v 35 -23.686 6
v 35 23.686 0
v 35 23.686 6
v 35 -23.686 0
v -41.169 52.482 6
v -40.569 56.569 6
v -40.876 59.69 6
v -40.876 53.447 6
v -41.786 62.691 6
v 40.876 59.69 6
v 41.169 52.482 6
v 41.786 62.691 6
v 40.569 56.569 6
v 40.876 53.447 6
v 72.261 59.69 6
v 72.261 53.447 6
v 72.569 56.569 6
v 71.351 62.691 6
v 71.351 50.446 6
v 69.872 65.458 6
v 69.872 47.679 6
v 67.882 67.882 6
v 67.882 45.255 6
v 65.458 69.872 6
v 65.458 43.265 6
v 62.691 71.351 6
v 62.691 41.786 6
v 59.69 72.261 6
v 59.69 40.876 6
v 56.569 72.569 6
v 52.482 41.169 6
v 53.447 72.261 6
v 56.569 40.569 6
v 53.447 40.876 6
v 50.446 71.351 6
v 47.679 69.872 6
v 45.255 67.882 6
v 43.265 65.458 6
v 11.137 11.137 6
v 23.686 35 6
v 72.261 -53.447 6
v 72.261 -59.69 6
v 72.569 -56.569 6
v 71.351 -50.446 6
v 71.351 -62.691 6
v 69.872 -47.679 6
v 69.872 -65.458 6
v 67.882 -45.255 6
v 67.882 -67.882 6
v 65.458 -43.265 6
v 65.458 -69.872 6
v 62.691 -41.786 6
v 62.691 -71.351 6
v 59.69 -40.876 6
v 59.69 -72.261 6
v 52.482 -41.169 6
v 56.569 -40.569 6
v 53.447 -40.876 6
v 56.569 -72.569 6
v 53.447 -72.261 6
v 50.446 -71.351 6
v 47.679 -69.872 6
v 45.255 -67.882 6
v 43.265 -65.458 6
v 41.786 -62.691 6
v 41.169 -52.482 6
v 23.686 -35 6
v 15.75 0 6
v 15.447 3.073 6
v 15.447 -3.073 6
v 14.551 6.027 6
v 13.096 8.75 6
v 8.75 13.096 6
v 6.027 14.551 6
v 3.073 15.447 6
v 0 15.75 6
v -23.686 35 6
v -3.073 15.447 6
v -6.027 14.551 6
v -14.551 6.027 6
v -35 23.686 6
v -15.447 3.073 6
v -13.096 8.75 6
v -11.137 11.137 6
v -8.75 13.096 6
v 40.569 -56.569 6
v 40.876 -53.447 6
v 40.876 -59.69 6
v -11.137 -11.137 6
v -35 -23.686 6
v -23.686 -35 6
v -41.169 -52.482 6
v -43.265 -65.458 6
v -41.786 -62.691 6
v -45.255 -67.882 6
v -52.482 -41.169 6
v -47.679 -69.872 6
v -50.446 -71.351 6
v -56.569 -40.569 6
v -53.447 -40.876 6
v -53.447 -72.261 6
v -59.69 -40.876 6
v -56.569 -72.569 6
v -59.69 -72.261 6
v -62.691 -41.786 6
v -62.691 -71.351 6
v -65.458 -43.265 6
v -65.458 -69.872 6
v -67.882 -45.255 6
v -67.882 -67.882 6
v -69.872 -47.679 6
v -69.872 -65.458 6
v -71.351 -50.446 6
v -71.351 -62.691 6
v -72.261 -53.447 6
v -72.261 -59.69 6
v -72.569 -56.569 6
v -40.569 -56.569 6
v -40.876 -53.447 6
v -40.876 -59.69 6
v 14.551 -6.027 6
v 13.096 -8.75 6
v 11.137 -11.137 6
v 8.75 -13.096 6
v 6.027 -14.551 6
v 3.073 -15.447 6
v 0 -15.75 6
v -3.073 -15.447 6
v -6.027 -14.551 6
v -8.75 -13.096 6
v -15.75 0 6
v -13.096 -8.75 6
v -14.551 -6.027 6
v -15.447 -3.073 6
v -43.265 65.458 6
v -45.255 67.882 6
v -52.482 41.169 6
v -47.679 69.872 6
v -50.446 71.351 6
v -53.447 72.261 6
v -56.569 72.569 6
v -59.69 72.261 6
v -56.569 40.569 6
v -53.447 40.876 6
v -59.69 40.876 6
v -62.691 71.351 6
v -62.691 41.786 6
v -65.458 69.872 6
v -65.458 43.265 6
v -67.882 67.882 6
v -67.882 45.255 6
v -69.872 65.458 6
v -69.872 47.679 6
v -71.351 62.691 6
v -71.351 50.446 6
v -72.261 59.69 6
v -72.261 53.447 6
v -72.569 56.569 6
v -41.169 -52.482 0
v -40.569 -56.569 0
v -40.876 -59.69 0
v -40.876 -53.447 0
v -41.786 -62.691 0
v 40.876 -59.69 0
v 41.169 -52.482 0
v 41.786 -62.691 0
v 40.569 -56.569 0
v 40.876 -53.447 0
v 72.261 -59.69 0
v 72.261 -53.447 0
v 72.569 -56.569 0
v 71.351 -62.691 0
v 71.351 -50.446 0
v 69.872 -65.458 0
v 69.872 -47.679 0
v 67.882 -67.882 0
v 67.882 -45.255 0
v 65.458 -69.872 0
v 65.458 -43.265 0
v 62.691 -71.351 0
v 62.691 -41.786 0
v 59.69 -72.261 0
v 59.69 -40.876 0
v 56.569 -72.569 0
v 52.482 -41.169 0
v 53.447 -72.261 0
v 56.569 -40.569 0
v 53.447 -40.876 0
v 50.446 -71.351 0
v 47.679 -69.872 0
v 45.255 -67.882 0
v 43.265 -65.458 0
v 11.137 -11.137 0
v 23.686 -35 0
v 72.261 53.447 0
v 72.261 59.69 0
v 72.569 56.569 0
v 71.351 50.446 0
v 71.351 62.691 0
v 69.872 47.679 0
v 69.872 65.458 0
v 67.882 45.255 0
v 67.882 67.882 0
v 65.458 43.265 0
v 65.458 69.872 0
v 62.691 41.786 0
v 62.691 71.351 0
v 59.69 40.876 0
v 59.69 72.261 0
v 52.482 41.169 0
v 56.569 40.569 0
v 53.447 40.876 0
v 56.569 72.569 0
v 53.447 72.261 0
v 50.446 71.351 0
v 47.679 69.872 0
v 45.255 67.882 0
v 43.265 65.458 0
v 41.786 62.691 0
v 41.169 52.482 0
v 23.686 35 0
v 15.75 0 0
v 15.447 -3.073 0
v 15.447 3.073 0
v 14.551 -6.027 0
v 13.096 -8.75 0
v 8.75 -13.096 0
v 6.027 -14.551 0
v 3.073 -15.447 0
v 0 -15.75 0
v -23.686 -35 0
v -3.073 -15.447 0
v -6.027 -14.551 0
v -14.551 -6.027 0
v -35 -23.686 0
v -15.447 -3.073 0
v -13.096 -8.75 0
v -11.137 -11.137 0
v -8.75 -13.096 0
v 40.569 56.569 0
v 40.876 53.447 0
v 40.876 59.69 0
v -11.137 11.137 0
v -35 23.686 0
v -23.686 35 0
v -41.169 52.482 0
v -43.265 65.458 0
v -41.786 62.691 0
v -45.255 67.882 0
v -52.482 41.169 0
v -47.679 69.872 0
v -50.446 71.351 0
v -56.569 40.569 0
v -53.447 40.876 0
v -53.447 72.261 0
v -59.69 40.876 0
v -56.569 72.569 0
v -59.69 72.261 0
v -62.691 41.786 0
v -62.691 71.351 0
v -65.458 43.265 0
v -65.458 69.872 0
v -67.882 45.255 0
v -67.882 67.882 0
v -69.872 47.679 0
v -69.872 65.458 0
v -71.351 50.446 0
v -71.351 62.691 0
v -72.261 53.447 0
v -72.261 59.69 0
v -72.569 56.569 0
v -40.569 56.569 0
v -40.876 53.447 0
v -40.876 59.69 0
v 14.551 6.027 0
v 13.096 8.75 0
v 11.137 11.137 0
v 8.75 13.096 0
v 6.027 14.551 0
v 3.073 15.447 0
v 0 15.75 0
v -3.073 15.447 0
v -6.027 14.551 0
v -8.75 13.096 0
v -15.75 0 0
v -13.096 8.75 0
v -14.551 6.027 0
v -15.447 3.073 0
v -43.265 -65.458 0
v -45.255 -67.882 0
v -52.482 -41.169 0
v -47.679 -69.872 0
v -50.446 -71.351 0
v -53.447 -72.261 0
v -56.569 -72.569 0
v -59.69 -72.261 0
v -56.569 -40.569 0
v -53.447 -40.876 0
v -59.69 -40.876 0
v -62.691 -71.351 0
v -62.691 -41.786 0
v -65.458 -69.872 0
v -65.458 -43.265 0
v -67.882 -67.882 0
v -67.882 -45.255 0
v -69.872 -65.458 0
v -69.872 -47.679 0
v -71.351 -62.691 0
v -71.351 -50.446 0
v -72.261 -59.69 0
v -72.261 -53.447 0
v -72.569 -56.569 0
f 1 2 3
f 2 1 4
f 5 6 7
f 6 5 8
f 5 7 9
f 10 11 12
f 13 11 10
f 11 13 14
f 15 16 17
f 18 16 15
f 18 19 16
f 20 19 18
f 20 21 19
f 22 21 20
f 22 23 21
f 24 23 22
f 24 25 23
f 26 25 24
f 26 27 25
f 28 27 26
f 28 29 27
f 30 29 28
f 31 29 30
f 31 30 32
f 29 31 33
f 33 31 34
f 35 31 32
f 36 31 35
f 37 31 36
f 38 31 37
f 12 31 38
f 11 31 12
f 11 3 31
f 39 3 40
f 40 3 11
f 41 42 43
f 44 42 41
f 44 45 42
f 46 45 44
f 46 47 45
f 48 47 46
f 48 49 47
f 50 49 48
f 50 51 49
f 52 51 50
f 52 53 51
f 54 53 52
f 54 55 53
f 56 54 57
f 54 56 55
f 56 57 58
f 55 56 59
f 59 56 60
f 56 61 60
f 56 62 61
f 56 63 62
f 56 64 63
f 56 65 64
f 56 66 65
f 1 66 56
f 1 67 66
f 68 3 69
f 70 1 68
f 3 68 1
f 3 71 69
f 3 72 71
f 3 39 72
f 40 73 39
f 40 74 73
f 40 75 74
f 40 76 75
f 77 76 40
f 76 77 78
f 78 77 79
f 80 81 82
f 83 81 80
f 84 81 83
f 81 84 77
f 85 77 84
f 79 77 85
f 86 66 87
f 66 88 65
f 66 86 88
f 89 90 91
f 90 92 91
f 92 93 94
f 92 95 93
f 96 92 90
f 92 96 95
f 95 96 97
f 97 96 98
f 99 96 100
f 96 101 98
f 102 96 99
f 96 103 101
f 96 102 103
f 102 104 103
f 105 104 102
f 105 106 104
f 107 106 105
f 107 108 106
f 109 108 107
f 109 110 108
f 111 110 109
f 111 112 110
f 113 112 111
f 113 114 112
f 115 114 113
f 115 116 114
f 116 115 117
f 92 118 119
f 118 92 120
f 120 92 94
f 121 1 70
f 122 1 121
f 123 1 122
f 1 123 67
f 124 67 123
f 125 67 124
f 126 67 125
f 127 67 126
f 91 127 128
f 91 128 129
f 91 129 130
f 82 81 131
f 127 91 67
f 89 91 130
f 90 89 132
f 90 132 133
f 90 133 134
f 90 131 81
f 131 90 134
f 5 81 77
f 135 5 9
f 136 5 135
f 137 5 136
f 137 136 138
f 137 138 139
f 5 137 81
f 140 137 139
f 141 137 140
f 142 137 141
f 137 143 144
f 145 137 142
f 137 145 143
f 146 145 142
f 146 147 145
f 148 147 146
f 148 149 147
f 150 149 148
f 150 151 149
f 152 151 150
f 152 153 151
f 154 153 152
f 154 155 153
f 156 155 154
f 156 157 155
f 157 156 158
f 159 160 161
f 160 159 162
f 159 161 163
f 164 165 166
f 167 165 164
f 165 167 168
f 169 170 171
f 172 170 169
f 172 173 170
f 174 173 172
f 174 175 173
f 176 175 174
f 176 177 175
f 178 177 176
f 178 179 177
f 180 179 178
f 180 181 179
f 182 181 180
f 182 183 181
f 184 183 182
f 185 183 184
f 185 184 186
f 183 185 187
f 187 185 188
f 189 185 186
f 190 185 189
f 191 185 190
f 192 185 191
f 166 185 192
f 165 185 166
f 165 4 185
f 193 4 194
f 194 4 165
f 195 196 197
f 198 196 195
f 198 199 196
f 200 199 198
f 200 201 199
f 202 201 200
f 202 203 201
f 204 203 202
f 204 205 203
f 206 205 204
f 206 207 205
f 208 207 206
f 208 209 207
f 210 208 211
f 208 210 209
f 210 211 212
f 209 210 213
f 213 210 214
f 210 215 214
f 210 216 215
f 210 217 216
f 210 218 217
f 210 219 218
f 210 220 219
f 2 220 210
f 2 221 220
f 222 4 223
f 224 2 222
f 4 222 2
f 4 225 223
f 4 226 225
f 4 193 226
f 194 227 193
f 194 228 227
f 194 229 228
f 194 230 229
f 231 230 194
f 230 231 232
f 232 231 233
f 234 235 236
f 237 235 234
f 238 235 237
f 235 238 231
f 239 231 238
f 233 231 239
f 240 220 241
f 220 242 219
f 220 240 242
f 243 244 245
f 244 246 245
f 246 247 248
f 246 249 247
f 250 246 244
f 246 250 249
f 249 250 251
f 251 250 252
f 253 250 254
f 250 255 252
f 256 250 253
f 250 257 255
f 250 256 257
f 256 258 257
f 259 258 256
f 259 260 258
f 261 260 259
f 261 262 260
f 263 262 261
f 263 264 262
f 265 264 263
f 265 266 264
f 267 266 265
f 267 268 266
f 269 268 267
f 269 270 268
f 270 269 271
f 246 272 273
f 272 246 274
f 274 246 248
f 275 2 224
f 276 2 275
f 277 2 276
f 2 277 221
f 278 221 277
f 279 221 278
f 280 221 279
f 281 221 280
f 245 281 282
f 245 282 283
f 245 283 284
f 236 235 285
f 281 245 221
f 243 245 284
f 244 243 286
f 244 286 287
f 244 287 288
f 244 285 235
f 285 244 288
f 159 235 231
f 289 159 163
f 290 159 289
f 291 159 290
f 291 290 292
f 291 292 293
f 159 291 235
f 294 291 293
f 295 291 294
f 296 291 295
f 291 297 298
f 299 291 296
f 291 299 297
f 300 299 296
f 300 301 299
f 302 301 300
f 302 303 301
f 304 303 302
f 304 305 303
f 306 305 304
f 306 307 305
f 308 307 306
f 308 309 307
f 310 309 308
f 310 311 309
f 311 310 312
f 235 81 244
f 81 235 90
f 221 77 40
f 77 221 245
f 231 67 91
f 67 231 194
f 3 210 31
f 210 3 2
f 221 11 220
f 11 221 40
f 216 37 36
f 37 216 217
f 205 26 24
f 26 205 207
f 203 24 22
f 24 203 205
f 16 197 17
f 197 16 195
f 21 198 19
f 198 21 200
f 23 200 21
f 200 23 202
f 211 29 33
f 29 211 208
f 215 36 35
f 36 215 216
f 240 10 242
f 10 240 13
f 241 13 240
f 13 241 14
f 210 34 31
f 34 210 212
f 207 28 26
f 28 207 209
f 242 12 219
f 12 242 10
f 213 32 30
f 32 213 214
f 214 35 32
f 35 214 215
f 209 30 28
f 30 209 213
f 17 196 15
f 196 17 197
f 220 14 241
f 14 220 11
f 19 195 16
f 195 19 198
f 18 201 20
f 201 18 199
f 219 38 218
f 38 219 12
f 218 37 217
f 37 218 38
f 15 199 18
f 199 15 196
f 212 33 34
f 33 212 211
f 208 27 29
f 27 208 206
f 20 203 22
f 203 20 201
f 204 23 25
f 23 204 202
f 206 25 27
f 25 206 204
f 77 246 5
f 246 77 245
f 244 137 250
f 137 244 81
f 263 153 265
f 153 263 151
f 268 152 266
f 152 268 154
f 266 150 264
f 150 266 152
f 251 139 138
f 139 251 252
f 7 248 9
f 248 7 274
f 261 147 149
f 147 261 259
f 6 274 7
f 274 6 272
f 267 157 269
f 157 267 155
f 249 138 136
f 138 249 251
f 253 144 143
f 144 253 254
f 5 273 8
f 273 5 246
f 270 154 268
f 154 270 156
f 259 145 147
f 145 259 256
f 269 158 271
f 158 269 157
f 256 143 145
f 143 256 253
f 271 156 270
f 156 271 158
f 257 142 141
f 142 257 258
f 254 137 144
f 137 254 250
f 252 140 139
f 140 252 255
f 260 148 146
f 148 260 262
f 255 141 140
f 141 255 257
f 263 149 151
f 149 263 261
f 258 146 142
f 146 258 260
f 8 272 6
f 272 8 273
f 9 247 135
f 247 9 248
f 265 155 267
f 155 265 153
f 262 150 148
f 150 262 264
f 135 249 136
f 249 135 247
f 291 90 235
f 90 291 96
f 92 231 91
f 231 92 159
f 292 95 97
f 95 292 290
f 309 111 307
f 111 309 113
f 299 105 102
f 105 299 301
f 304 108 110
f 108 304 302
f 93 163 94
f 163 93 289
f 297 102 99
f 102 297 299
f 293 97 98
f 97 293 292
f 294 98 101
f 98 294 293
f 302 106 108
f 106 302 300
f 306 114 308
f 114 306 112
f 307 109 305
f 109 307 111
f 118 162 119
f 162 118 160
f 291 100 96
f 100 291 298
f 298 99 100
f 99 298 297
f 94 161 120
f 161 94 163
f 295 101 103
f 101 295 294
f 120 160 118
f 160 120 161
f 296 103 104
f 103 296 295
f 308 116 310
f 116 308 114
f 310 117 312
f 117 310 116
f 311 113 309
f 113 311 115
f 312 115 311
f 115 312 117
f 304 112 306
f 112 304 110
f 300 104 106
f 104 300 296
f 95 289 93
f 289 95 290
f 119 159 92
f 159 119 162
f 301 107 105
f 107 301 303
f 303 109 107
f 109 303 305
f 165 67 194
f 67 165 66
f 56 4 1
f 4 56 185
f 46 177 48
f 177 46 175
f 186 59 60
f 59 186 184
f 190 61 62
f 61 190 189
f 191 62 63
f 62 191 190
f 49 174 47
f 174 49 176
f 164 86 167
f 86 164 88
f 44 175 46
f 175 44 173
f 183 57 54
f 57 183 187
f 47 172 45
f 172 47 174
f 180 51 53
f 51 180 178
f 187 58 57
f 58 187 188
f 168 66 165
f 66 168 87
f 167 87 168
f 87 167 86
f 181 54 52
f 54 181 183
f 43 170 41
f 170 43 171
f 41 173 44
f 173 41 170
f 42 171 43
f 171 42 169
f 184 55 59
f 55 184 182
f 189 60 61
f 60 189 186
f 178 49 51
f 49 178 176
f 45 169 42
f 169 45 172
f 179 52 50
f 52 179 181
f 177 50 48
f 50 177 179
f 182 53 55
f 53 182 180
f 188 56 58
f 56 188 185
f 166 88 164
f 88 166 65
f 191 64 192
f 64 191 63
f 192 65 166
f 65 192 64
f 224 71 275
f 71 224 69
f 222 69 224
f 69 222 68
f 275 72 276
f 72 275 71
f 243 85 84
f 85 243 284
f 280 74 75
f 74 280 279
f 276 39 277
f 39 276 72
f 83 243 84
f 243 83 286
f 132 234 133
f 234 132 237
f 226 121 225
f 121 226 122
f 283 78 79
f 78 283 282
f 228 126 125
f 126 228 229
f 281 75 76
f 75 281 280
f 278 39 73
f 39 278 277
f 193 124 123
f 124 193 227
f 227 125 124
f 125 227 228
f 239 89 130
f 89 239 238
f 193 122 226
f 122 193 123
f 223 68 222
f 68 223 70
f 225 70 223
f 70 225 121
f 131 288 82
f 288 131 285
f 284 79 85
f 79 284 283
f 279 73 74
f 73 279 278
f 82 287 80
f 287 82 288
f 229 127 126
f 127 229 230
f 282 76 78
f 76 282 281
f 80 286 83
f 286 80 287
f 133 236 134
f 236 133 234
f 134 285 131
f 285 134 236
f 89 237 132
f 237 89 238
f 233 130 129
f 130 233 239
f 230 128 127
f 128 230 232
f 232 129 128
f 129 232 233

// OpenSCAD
$fn = 32;

// ----------------------------------------------------------------------
// Quadcopter frame: 192 mm across the motor pads, arms 80 mm
// ----------------------------------------------------------------------

// --- parameters (mm) ---
hub = 70;                 // central plate size
plate_t = 6;              // plate thickness
arm_len = 80;             // hub centre to motor pad centre
bar_w = 16;               // arm width
pad_d = 32;               // motor pad diameter
centre_d = 31.5;          // central cut-out for the stack

module arm_bar() {
  /* flat bar: hull of a stub inside the hub and a box at the pad */
  hull() {
    translate([hub / 4, 0, plate_t / 2]) cube([bar_w, bar_w, plate_t], center = true);
    translate([arm_len, 0, plate_t / 2]) cube([bar_w, bar_w, plate_t], center = true);
  }
}

module pad() {
  translate([arm_len, 0, 0]) cylinder(h = plate_t, d = pad_d);
}

module frame() {
  translate([-hub / 2, -hub / 2, 0]) cube([hub, hub, plate_t]);
  rotate([0, 0, 45]) arm_bar();
  rotate([0, 0, 45]) pad();
  rotate([0, 0, 135]) arm_bar();
  rotate([0, 0, 135]) pad();
  rotate([0, 0, 225]) arm_bar();
  rotate([0, 0, 225]) pad();
  rotate([0, 0, 315]) arm_bar();
  rotate([0, 0, 315]) pad();
}

difference() {
  frame();
  translate([0, 0, -1]) cylinder(h = plate_t + 2, d = centre_d);
}
